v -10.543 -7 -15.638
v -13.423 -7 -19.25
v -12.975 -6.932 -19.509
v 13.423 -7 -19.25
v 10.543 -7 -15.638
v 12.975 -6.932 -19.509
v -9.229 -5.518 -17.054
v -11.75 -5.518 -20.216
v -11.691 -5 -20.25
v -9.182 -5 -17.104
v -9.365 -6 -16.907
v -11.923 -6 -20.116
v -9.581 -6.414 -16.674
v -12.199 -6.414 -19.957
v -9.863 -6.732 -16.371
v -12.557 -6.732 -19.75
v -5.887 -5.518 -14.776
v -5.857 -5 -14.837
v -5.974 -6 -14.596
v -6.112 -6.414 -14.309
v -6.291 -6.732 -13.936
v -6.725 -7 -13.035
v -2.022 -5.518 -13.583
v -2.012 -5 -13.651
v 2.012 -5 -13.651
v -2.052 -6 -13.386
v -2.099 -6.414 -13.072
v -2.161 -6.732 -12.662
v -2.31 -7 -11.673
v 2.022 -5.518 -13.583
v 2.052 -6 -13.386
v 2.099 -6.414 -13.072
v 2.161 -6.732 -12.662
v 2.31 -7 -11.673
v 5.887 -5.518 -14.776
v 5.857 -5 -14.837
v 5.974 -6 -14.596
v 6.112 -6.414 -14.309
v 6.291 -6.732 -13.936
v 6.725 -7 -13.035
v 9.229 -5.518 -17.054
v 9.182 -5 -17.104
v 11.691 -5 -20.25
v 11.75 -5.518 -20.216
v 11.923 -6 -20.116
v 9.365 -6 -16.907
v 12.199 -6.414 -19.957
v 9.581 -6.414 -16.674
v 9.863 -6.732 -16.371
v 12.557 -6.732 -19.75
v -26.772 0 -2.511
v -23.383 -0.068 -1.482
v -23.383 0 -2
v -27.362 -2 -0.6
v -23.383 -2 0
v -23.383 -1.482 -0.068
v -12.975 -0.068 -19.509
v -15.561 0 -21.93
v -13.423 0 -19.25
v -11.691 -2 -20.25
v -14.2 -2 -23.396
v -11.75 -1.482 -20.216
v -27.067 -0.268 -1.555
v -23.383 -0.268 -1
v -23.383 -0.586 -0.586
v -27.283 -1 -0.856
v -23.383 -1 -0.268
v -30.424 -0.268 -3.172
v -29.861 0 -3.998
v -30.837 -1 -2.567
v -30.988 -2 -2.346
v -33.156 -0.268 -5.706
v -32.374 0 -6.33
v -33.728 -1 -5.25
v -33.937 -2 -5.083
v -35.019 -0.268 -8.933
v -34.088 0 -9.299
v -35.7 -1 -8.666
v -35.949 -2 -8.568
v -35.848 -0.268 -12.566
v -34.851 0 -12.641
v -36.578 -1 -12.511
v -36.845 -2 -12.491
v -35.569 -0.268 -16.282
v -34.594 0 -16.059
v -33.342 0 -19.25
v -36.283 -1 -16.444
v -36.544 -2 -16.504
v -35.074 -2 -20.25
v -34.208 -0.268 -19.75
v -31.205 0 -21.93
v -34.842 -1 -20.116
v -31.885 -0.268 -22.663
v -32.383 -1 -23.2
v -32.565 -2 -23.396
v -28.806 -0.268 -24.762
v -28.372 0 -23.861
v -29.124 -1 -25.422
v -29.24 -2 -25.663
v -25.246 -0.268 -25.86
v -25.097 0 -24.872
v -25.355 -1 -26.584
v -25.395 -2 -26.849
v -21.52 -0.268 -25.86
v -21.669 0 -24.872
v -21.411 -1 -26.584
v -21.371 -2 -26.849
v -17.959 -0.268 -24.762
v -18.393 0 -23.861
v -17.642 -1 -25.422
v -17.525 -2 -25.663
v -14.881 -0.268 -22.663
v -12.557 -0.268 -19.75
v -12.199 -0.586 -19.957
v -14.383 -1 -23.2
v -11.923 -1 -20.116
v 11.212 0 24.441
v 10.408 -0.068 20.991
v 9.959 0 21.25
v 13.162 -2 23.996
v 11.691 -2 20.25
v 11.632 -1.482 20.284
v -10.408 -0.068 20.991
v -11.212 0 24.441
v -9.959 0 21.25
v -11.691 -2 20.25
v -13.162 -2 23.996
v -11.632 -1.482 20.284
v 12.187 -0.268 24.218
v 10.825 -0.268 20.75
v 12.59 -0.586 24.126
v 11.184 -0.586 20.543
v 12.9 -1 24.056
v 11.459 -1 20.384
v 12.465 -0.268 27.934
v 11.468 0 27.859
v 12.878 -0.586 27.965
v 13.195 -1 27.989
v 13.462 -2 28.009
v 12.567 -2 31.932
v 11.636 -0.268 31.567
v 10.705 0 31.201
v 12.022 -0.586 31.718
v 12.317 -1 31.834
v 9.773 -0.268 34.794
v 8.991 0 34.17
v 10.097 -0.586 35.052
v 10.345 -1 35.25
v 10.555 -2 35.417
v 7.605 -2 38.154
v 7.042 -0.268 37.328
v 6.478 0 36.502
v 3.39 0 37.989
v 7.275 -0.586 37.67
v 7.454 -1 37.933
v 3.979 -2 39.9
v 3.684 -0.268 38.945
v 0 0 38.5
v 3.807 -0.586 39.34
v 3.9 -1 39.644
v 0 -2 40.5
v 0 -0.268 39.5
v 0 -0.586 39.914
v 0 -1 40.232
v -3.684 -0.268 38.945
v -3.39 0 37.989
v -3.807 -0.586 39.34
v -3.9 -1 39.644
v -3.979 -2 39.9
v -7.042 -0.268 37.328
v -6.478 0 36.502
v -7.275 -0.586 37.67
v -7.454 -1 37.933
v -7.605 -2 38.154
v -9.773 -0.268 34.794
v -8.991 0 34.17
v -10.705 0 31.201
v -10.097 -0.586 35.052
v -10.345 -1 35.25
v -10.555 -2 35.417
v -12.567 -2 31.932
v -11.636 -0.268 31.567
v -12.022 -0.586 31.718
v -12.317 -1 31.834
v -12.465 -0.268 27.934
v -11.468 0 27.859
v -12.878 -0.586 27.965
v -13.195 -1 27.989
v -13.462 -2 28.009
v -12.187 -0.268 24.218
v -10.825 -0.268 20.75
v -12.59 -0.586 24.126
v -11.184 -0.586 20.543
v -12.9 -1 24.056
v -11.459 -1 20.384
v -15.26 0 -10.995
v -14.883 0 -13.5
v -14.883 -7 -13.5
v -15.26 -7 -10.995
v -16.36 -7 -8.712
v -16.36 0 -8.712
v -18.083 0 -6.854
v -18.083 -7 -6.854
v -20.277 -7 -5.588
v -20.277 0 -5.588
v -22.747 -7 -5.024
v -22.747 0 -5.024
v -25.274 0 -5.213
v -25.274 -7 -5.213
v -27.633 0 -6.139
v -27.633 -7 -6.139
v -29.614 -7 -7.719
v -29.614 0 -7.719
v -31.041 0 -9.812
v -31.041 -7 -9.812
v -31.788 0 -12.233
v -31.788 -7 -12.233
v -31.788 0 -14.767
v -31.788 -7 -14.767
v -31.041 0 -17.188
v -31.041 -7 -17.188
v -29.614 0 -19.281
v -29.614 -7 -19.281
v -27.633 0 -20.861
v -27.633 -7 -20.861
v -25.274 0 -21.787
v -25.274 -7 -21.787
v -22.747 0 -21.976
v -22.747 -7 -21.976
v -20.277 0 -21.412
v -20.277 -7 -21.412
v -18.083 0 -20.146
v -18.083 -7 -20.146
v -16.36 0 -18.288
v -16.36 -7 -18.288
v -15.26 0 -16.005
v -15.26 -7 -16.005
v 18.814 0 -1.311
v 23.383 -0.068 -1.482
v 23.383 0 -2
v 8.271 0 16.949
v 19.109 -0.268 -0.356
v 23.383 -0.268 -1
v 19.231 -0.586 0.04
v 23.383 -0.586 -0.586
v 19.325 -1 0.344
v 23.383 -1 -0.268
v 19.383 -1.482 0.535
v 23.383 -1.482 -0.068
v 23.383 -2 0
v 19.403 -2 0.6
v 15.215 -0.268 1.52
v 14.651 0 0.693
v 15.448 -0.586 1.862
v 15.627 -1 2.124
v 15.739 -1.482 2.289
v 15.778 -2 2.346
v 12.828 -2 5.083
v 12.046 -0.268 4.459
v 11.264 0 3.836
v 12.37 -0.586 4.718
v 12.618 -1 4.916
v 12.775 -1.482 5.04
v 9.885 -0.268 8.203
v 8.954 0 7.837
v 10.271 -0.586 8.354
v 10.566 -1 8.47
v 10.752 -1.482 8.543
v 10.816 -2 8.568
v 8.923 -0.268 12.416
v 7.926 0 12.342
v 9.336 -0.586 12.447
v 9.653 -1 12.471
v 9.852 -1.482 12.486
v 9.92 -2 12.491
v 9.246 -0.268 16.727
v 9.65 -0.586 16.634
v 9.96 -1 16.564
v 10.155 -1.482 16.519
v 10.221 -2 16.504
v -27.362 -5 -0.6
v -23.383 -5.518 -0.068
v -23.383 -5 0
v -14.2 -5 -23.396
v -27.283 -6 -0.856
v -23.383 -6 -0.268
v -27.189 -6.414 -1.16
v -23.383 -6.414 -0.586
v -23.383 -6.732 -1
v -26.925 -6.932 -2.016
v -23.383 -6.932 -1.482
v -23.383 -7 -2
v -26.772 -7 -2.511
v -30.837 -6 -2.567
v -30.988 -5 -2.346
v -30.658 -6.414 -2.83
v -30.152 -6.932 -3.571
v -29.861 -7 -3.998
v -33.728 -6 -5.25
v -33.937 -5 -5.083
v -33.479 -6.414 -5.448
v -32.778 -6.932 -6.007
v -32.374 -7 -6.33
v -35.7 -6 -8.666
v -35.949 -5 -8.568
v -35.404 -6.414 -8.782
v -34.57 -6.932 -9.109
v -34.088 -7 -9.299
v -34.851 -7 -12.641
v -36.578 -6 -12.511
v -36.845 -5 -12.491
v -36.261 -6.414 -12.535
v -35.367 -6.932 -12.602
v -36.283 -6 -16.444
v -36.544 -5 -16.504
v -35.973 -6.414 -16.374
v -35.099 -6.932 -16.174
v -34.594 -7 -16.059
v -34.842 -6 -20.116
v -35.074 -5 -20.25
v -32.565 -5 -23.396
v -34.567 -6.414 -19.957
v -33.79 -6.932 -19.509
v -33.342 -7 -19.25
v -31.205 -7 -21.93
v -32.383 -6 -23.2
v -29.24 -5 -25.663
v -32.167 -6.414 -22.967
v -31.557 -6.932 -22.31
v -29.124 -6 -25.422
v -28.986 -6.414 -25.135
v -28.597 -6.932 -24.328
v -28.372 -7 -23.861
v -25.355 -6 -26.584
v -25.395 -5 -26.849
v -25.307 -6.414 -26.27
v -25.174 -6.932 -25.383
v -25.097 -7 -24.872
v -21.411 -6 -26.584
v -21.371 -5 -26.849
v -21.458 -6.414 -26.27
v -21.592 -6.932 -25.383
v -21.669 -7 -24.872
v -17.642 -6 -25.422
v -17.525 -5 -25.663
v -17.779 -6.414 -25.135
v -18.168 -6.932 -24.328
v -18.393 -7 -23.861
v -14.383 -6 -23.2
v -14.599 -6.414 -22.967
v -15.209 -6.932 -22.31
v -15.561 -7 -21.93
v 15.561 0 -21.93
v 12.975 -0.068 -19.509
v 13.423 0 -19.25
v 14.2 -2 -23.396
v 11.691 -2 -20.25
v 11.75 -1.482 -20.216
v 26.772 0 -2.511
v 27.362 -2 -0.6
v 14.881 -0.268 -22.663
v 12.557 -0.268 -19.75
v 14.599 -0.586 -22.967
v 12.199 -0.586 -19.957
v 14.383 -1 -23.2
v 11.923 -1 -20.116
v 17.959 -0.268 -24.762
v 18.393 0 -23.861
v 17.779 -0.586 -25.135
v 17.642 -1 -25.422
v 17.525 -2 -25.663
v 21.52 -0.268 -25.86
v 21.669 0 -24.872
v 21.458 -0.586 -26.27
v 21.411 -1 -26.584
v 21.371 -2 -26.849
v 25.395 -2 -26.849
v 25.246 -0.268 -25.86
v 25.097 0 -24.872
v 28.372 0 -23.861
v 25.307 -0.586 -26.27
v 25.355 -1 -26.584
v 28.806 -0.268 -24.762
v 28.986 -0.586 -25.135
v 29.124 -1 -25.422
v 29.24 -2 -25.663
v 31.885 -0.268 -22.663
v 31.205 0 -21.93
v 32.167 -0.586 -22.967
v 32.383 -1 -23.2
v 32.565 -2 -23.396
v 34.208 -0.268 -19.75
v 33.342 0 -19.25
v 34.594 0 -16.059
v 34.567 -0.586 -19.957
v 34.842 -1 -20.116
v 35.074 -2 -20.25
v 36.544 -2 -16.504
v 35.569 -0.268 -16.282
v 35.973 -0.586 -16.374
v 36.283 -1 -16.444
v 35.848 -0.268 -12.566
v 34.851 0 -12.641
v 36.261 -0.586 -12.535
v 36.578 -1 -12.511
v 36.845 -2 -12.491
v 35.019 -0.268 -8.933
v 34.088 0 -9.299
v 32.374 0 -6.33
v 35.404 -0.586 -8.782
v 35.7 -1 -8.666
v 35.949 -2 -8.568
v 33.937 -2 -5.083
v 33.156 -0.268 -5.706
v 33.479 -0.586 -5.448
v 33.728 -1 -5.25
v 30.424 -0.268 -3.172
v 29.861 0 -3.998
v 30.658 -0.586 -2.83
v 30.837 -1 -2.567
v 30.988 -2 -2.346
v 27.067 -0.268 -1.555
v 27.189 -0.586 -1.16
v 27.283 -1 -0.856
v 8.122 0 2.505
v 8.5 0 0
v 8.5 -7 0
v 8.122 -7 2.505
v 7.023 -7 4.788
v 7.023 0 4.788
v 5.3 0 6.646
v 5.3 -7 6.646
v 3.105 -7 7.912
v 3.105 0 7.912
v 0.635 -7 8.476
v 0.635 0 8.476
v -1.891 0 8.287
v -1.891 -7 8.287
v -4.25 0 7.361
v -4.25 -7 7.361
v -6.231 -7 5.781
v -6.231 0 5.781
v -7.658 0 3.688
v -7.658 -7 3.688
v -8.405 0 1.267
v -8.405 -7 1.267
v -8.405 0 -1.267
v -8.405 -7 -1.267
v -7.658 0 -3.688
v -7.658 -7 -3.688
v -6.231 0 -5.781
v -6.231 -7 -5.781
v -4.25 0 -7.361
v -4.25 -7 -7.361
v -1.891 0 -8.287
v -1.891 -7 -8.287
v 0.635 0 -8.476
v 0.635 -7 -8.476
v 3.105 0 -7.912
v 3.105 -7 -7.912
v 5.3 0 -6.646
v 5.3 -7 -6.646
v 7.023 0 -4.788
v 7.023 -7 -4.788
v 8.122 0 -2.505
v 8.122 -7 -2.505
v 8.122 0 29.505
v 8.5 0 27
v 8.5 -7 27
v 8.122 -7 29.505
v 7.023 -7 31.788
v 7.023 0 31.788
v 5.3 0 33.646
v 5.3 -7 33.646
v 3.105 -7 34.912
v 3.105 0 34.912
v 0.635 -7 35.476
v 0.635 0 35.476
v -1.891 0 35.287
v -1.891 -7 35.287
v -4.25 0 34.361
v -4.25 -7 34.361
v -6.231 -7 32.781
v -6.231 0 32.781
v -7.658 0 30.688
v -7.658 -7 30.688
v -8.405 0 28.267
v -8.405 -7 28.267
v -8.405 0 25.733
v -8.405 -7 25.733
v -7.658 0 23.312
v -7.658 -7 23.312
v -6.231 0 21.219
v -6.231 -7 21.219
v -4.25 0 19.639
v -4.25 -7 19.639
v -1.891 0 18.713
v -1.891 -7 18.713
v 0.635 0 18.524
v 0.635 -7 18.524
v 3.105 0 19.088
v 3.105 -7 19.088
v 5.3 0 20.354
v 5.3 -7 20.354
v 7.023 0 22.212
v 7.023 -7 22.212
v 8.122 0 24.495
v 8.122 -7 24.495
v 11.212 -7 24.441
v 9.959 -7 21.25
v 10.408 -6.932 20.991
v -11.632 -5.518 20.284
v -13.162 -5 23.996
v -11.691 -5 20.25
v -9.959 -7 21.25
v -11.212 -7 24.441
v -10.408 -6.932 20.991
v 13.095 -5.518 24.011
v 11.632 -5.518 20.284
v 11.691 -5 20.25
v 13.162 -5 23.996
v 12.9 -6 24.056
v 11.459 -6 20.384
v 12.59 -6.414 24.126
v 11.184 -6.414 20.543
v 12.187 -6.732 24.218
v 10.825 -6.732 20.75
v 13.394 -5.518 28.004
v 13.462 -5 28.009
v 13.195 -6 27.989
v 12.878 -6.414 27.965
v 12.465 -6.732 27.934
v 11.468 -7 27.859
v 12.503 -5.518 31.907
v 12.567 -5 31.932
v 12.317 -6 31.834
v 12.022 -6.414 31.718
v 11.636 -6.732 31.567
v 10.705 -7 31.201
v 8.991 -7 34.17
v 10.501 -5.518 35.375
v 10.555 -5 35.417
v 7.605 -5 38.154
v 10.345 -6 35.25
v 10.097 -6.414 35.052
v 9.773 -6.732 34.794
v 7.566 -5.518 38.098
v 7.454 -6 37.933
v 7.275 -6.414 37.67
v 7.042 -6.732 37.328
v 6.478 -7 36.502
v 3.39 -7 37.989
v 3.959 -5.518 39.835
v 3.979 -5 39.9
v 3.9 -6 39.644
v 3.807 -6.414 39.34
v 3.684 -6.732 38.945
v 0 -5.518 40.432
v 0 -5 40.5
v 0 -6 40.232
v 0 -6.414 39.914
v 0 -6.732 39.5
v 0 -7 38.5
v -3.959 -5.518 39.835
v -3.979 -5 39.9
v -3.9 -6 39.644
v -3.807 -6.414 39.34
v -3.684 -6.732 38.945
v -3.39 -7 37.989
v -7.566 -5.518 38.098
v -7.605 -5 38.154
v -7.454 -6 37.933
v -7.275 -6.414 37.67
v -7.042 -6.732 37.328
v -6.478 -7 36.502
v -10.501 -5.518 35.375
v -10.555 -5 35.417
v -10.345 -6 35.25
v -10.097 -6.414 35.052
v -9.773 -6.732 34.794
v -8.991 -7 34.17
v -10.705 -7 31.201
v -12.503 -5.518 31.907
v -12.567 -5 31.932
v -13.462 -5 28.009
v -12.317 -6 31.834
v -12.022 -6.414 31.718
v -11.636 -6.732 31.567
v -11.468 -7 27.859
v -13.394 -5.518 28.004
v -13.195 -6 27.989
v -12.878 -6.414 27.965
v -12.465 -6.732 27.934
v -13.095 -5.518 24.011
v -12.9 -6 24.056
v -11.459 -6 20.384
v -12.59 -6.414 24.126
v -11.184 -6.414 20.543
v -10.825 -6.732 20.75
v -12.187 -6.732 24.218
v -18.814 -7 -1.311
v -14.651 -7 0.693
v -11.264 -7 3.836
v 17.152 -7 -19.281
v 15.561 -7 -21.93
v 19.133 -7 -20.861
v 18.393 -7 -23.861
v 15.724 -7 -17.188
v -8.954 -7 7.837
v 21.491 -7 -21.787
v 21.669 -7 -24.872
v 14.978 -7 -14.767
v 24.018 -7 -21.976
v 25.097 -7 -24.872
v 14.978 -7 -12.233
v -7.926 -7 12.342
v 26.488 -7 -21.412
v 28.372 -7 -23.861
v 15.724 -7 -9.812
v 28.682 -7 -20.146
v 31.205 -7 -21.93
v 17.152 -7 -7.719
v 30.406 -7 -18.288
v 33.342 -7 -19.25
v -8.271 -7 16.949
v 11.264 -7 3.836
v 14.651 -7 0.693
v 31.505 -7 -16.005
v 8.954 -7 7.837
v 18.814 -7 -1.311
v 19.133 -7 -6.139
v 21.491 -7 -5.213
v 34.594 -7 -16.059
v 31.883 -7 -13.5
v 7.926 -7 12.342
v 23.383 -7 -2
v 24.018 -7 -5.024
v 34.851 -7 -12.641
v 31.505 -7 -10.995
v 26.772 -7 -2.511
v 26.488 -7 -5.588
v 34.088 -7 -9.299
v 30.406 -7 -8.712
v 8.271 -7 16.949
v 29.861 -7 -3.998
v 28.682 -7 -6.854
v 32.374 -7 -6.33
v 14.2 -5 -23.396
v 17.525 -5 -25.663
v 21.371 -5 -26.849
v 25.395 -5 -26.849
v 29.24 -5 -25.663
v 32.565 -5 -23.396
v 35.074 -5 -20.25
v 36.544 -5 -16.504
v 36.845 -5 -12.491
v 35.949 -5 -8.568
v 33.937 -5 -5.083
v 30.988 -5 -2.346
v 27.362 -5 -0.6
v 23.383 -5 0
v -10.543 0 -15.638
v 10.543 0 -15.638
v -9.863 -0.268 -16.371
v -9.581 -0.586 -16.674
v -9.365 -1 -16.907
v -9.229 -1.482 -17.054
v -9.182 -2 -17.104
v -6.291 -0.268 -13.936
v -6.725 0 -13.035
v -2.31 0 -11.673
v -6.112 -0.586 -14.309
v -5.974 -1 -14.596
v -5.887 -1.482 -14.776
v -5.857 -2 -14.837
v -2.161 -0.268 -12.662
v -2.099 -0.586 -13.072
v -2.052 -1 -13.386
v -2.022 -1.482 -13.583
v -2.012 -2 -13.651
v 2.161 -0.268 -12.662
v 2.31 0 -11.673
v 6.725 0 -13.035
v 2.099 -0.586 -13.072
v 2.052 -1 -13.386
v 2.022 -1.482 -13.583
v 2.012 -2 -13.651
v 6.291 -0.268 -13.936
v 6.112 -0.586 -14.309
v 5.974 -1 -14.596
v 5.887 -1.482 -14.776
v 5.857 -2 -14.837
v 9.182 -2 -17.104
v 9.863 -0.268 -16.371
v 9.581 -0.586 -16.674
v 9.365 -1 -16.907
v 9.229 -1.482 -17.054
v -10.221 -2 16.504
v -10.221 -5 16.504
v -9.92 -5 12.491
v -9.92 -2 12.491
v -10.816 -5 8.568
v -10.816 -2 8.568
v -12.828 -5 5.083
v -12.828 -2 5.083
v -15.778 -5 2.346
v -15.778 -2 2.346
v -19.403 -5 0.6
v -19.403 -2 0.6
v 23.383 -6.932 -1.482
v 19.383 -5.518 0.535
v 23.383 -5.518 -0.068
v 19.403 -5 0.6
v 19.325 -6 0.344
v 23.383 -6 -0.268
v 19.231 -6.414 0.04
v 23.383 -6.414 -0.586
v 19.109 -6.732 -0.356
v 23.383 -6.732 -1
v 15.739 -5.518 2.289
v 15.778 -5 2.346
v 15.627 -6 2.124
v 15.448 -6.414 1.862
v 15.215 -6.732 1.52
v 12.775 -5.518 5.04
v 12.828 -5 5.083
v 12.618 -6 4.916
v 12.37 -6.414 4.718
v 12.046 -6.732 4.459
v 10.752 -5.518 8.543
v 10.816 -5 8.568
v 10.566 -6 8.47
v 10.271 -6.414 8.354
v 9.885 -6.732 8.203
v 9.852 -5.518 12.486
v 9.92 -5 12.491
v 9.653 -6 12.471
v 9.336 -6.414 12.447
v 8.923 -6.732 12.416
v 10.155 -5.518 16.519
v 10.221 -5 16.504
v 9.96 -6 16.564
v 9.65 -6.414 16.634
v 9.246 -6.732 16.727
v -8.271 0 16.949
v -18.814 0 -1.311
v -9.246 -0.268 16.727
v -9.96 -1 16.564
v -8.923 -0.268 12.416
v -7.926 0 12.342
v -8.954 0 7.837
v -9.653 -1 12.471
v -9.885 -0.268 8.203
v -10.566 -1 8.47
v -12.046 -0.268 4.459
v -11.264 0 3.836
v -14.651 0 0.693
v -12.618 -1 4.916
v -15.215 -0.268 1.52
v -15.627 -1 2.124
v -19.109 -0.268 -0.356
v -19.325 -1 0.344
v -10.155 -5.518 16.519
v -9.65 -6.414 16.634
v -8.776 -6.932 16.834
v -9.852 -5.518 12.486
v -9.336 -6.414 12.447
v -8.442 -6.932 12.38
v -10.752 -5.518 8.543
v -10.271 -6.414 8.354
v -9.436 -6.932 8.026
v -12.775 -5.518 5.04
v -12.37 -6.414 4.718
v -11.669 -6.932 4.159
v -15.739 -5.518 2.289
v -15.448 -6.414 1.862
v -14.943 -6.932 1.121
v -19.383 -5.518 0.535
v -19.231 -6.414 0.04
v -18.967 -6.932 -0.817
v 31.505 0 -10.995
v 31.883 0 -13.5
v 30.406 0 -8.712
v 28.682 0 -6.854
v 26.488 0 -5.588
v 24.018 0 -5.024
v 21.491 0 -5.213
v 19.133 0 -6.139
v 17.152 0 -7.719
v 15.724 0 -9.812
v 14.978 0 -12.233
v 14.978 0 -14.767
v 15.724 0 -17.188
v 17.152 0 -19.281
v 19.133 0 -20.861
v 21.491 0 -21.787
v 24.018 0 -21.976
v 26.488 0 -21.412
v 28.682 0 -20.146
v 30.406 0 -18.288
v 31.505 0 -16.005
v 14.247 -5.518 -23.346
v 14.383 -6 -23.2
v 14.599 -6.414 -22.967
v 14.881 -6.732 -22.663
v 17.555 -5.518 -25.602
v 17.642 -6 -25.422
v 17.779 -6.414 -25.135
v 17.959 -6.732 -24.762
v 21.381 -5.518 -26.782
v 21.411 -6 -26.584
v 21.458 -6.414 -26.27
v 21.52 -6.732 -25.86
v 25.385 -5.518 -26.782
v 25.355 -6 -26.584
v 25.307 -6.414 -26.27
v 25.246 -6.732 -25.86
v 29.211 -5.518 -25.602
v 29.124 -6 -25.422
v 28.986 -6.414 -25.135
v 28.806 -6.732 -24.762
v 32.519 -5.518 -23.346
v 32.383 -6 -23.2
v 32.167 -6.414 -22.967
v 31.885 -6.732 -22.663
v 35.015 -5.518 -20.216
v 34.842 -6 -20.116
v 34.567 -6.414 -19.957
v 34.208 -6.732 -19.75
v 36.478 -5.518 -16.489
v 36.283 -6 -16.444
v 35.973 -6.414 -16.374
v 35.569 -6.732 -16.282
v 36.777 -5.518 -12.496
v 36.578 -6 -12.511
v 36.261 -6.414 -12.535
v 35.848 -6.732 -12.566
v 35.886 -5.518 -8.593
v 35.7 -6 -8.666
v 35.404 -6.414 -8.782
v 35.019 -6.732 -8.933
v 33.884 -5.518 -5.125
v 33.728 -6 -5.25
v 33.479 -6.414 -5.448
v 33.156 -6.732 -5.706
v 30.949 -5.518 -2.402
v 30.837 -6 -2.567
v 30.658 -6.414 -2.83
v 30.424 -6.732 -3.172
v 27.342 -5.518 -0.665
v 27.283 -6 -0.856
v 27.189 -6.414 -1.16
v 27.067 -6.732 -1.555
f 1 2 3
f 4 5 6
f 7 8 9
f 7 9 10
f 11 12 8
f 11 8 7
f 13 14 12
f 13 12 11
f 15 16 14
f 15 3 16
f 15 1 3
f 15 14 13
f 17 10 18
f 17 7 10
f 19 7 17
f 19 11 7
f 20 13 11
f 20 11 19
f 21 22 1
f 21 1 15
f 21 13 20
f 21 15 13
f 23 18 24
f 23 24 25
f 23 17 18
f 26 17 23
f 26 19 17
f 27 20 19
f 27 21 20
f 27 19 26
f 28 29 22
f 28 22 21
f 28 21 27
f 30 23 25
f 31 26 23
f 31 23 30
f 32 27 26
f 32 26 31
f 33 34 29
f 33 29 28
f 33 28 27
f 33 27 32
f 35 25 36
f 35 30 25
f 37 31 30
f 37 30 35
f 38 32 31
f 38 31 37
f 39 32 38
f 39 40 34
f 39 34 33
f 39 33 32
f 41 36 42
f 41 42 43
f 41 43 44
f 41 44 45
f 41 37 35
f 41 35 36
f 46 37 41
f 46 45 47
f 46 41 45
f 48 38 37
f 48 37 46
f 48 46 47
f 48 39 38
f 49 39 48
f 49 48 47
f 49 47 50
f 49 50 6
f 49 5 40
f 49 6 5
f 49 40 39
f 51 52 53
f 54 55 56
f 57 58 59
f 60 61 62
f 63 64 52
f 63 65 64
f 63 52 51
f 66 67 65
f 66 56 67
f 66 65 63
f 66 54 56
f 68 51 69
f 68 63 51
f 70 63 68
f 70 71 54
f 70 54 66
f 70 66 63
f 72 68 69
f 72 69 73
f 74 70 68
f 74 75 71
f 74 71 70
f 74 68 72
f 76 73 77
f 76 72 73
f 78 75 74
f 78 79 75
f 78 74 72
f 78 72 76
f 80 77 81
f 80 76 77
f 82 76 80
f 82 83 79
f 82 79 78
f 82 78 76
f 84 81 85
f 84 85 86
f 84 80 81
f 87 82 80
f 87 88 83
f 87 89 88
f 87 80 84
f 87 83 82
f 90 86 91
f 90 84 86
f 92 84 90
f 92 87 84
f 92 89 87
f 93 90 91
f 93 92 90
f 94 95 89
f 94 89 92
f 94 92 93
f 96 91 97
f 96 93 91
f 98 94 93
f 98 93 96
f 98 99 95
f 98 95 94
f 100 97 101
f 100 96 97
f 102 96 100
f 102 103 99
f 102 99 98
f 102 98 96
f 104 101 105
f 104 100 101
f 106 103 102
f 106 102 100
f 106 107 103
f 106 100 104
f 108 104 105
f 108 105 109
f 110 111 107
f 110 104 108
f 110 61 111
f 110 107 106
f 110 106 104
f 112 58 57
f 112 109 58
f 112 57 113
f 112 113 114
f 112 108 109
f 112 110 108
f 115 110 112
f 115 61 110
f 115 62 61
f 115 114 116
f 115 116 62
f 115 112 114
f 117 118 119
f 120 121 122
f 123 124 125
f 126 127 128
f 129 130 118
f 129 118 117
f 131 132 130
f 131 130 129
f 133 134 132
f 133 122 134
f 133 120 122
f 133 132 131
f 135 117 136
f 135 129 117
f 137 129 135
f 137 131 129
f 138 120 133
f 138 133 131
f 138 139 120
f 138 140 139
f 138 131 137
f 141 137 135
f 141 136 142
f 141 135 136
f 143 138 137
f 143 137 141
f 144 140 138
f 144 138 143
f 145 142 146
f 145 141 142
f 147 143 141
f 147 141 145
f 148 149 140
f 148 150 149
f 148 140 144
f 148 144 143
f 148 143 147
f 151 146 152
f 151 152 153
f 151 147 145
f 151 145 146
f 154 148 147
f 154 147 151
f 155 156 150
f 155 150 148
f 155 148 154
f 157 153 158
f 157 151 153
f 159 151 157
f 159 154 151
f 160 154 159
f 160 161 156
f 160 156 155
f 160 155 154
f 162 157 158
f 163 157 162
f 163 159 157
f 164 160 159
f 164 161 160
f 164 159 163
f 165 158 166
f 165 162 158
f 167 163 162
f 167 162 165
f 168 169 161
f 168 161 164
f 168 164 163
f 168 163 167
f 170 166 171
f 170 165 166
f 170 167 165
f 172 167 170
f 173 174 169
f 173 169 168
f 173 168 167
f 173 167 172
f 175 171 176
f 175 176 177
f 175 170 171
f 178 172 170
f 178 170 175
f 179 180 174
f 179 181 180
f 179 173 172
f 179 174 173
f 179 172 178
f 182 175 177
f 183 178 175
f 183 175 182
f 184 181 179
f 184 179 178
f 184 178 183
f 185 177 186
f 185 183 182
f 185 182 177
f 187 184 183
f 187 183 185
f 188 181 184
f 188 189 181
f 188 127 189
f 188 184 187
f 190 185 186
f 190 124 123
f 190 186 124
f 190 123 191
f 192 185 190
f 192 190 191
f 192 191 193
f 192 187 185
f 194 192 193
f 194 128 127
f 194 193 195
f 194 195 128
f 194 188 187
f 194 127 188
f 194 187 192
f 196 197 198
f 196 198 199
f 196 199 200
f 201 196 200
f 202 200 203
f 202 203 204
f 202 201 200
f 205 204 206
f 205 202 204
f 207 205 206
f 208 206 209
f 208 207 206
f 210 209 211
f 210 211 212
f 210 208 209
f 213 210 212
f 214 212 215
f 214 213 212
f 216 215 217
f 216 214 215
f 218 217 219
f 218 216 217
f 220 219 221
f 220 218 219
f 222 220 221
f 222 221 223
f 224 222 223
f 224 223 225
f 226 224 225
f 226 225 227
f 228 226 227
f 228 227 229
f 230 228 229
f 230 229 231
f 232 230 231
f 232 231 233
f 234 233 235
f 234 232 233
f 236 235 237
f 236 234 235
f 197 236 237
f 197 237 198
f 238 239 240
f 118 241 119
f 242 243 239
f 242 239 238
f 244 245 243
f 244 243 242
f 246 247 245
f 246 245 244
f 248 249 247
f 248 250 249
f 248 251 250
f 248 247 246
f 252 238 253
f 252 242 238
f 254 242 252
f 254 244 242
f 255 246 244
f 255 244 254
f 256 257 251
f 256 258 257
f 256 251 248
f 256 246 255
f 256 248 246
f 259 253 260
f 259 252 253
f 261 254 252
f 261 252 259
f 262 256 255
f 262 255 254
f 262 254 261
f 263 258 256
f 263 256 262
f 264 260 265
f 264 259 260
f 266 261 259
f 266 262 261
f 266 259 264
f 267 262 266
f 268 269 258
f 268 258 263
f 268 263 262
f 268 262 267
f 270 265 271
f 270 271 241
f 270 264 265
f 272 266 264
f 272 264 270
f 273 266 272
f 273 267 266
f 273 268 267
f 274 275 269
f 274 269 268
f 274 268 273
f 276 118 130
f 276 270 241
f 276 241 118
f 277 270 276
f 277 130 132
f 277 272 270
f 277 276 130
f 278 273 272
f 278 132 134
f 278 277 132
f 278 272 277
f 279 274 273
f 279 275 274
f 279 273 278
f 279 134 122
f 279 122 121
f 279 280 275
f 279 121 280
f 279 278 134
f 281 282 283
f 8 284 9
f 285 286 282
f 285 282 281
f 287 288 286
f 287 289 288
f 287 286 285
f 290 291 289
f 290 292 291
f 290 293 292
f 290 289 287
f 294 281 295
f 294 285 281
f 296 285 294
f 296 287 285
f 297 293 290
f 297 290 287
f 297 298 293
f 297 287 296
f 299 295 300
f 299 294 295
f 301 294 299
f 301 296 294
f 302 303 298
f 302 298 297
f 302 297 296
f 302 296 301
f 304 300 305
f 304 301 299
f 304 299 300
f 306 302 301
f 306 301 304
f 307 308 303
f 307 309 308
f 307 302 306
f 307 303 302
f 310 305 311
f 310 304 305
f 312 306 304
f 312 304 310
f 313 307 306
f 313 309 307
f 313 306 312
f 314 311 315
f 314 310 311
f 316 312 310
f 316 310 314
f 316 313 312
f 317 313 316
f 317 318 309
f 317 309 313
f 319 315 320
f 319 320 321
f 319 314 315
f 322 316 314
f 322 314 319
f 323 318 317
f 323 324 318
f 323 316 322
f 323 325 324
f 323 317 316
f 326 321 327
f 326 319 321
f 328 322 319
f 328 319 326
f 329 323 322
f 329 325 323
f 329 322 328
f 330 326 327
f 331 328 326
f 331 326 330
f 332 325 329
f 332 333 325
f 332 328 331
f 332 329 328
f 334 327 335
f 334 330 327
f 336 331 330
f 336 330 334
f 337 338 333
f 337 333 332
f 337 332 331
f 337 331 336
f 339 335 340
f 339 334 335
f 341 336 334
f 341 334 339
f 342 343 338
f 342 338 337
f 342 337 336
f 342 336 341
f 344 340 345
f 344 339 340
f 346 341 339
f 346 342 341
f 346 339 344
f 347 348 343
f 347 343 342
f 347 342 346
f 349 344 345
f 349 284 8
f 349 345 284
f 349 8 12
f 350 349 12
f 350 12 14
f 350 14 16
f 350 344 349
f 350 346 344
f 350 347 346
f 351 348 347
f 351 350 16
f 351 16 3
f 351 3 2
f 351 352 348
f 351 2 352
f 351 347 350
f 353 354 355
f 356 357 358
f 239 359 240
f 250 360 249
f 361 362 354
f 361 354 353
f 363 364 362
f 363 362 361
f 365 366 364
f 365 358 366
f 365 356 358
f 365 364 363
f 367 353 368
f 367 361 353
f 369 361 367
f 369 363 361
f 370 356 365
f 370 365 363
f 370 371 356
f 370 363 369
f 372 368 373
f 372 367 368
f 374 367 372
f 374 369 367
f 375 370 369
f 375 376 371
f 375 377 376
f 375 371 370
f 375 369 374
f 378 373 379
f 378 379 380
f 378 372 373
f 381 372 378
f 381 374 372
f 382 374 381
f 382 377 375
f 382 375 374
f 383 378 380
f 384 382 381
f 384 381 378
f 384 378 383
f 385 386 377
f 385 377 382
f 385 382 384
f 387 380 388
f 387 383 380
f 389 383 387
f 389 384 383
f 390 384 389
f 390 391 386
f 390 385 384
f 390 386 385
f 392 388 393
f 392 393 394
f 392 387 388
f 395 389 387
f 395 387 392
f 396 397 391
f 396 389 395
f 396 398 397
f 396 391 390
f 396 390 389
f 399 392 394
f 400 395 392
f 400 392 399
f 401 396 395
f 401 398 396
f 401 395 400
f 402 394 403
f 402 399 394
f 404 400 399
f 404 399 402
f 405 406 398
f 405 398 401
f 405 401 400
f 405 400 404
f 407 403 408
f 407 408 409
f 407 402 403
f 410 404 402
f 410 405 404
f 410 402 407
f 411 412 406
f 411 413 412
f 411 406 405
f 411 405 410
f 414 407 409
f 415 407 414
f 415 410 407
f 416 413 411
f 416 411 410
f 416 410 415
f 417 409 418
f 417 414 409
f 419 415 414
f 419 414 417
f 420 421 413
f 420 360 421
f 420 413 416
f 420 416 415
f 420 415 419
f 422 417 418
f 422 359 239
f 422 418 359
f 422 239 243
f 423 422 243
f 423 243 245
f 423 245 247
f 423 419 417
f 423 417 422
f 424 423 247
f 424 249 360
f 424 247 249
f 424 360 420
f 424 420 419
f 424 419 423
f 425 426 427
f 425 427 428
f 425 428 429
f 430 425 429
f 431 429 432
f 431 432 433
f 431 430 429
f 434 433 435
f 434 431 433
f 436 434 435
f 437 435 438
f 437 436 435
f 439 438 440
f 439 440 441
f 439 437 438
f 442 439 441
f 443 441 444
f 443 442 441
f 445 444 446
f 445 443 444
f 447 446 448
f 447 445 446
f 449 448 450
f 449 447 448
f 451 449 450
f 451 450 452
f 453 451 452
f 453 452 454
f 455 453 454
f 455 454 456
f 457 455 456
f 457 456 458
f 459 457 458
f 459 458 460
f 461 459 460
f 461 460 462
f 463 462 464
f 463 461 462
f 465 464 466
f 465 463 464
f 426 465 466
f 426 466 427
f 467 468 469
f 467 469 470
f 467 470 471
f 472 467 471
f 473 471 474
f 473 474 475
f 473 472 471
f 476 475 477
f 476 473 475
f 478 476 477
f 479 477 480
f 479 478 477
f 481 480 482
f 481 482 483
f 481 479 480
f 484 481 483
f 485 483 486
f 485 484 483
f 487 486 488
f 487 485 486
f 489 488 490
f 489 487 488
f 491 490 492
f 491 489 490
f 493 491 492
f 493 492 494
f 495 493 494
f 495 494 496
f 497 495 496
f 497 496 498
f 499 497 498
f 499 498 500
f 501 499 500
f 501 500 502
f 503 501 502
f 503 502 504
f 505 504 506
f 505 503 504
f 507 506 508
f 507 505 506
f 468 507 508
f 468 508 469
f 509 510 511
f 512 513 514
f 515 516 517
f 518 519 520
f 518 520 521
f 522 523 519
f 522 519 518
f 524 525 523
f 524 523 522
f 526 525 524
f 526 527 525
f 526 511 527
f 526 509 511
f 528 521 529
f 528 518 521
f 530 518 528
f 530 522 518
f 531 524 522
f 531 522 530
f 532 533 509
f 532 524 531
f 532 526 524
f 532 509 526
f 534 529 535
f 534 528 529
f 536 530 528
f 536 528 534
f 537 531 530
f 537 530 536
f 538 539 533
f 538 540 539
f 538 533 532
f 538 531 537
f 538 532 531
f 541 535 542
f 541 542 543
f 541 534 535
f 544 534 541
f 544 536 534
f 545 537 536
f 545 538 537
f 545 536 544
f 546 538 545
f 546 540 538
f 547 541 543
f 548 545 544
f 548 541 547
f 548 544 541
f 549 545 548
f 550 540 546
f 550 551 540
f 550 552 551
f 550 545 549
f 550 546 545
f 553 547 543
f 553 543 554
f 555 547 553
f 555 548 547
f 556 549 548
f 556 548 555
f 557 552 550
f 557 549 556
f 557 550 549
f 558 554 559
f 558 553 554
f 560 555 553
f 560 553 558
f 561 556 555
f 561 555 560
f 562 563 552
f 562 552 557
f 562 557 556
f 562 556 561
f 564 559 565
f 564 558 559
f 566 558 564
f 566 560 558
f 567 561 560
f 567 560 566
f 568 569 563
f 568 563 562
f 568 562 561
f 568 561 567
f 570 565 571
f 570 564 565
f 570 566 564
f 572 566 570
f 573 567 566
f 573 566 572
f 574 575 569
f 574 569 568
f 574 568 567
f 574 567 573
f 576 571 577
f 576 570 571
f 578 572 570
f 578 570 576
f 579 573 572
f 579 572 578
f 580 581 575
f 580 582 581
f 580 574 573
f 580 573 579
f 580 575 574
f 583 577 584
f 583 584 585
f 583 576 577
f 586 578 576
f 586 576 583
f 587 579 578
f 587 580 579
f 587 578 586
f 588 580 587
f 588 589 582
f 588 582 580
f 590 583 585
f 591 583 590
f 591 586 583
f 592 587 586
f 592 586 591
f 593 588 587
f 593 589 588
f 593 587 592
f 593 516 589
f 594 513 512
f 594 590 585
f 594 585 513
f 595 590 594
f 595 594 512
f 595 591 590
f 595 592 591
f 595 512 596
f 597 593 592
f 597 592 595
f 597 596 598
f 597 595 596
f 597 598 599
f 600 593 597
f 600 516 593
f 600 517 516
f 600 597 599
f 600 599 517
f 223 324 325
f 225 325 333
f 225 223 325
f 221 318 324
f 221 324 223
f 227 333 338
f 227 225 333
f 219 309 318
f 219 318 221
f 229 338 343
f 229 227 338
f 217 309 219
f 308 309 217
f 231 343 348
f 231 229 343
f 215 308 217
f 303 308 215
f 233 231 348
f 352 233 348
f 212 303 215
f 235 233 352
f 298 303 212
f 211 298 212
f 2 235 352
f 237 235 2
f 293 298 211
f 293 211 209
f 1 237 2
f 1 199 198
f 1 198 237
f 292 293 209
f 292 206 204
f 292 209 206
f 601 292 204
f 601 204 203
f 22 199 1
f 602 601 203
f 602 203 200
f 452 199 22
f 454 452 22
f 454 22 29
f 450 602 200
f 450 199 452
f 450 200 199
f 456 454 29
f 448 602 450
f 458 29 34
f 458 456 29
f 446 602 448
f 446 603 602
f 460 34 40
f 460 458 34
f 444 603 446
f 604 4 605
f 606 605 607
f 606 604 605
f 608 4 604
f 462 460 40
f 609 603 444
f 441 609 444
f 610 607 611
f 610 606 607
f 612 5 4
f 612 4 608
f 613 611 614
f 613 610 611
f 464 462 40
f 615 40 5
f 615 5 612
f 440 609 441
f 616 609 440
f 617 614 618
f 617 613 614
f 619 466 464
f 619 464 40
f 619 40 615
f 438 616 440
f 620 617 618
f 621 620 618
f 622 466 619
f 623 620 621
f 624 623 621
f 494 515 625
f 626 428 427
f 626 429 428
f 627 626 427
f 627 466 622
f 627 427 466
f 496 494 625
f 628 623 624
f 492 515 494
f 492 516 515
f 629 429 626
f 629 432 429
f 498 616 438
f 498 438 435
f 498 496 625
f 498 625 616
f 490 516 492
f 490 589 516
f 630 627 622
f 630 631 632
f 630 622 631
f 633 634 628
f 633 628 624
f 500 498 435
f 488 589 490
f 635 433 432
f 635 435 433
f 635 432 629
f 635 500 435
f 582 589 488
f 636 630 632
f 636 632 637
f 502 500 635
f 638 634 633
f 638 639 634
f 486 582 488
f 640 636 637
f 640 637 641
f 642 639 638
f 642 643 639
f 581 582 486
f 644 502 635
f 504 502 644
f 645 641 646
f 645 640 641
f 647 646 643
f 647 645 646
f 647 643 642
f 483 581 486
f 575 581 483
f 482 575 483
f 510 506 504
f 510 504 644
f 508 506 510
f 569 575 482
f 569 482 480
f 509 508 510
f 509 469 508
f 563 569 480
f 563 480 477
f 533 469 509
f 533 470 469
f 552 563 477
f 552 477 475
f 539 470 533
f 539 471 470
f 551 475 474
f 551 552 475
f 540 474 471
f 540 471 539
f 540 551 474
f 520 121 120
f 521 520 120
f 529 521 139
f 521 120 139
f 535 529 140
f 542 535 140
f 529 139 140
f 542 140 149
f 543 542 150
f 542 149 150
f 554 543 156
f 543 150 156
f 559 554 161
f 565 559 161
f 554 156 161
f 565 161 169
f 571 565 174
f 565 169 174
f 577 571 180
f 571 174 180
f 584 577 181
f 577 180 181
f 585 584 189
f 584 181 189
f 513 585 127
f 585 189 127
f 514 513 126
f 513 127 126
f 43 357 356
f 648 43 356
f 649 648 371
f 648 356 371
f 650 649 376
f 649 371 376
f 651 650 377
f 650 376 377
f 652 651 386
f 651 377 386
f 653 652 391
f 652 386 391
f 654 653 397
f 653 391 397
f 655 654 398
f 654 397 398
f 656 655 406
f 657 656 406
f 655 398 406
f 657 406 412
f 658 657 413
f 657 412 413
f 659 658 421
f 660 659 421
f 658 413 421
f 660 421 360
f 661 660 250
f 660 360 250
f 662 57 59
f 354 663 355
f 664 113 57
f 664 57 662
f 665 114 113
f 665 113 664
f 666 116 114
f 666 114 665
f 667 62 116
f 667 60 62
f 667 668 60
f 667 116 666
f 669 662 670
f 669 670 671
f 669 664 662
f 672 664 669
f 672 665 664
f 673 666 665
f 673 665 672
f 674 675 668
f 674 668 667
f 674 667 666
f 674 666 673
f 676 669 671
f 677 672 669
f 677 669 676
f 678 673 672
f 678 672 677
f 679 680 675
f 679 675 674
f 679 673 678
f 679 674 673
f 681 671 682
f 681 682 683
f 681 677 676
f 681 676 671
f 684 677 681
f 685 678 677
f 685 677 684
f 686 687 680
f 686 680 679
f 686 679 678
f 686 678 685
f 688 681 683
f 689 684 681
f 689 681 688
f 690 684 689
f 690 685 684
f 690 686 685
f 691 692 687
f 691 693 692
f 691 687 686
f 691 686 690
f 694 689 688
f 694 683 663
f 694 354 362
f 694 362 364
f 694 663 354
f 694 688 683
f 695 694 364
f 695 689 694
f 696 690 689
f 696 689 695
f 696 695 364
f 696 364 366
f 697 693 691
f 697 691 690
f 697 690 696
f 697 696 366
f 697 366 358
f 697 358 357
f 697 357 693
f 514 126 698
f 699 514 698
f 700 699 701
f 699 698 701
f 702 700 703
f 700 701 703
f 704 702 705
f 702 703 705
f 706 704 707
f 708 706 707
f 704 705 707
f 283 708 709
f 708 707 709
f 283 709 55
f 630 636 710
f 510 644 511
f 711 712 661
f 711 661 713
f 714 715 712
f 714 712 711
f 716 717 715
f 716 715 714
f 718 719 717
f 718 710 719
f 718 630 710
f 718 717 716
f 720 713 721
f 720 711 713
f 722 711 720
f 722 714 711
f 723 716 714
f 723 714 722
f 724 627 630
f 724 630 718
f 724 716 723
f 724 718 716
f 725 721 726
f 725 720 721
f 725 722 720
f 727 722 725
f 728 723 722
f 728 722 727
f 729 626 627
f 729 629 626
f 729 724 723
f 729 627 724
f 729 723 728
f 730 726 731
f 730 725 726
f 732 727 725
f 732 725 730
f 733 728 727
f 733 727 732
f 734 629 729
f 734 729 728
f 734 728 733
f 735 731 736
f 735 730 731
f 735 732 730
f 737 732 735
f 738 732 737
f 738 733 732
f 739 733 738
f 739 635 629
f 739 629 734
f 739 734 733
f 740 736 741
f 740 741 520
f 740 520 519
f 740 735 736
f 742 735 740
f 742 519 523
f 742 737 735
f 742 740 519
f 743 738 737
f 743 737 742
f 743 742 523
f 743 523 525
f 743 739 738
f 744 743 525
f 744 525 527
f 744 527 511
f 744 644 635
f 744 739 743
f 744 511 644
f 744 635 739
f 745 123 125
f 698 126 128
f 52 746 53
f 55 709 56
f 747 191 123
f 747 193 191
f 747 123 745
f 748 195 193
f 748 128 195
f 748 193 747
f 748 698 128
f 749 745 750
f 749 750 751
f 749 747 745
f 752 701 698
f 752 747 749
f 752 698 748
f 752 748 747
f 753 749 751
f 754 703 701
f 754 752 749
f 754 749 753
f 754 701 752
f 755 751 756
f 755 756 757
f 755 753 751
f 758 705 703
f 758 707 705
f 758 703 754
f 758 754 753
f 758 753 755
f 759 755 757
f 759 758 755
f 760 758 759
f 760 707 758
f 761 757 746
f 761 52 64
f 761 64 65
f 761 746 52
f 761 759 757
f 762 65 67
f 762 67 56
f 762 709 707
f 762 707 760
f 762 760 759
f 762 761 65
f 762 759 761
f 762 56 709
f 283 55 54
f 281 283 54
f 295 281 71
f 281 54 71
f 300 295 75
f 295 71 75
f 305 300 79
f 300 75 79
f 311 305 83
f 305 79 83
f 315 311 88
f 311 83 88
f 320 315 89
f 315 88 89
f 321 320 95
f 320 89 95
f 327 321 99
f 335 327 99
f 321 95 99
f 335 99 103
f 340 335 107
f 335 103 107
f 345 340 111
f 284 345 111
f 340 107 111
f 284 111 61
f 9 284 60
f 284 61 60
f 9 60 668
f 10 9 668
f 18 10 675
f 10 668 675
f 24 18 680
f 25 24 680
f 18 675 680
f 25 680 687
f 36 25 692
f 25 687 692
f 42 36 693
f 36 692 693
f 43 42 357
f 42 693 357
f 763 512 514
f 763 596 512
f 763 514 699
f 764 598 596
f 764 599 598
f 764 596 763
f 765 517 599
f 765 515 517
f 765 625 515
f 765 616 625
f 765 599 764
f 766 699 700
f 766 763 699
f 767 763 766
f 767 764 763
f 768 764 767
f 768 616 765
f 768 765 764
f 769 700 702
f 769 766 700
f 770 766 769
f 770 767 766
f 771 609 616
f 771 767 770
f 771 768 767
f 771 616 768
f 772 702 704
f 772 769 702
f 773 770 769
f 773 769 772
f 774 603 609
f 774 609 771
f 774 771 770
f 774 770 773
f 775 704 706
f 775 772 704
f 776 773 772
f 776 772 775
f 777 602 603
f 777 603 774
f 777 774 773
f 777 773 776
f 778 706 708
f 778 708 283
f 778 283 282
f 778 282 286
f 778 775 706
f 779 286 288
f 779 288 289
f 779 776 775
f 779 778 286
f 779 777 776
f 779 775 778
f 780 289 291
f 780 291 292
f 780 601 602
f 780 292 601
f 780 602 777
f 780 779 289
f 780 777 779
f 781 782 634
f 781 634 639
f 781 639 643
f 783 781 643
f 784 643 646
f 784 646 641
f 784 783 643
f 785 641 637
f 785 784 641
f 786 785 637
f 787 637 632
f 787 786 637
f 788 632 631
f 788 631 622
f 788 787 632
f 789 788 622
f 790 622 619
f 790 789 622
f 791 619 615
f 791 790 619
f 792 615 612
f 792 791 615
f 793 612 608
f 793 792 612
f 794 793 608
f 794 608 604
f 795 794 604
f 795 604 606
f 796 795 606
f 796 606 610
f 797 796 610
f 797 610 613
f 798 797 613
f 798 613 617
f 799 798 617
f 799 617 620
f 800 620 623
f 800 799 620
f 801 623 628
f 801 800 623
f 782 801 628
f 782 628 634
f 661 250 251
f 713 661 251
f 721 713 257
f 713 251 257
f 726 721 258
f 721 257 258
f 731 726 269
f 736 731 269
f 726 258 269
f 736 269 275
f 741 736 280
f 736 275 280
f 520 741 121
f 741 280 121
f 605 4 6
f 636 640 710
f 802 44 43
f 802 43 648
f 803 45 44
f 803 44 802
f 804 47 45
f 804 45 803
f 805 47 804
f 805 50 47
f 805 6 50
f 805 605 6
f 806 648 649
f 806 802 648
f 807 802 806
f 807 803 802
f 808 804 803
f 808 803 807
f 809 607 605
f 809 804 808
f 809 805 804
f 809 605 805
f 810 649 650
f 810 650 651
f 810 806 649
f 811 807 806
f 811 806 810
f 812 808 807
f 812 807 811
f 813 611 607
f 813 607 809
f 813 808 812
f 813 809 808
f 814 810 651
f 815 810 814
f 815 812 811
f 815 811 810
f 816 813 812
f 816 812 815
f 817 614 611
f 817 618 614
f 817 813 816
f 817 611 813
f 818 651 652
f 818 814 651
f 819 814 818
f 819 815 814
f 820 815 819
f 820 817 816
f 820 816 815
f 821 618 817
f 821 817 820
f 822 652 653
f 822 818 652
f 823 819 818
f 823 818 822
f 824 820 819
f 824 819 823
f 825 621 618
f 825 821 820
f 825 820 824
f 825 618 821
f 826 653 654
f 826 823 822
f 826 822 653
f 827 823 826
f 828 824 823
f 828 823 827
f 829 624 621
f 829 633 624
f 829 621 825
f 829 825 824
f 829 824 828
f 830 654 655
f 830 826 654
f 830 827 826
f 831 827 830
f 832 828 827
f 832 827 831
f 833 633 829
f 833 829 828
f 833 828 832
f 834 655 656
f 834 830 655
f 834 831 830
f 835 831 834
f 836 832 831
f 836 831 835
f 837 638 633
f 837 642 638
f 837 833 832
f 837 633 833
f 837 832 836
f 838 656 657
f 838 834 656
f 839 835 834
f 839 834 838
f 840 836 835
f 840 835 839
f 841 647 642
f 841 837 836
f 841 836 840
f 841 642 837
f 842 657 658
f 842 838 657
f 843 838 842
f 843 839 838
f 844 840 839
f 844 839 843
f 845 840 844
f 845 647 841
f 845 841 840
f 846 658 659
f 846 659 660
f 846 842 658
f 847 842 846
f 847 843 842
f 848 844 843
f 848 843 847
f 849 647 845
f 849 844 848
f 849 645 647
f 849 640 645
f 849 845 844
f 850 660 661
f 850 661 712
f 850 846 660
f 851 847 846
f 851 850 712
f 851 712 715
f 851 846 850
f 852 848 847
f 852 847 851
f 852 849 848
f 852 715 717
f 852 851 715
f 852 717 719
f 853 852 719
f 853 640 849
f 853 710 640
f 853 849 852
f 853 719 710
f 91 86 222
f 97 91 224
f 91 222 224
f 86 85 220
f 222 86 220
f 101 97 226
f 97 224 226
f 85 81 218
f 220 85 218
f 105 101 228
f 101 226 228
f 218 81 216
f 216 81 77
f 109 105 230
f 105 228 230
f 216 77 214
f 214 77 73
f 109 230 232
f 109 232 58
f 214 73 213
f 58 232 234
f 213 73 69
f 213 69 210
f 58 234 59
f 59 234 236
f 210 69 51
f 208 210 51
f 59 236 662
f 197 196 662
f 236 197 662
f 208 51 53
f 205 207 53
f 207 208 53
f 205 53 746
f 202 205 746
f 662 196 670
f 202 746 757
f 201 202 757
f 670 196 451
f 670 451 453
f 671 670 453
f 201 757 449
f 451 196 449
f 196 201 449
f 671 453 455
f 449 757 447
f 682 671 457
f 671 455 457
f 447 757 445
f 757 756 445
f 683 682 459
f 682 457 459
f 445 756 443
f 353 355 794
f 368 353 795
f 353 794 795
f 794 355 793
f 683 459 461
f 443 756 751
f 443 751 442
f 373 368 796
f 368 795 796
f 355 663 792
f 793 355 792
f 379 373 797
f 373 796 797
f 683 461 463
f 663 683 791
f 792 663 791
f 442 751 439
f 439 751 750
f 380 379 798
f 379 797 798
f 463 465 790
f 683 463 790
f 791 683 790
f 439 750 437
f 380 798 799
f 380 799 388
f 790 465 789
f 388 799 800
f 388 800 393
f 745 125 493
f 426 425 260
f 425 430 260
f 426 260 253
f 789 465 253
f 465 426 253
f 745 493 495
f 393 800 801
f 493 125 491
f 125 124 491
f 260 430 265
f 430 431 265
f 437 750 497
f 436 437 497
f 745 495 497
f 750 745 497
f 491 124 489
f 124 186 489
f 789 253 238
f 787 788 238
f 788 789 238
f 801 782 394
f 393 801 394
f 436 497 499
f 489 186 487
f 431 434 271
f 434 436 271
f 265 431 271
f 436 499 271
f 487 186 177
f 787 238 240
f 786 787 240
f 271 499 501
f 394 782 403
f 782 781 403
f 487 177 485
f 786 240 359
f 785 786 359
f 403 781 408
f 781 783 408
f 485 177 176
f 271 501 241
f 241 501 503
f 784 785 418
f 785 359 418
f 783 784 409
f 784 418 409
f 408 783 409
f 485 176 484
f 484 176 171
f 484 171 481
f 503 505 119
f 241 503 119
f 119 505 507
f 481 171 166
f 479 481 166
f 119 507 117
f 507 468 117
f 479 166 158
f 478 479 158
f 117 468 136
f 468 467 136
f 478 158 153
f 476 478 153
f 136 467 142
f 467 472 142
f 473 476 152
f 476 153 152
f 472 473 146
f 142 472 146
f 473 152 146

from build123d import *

# Parameters (mm, degrees)
F0_R     = 8.5
F1_DEPTH = 7
F2_R     = 2
F3_R     = 2


with BuildPart() as f1:
    # F0 (on Front) → F1 (new body)
    with BuildSketch(Plane.XZ):
        with BuildLine():
            ThreePointArc((23.382686, 0), (11.691343, 6.75), (11.691343, 20.25))
            ThreePointArc((11.691343, 20.25), (0, 40.5), (-11.691343, 20.25))
            ThreePointArc((-11.691343, 20.25), (-11.691343, 6.75), (-23.382686, 0))
            ThreePointArc((-23.382686, 0), (-35.074029, -20.25), (-11.691343, -20.25))
            ThreePointArc((-11.691343, -20.25), (0, -13.5), (11.691343, -20.25))
            ThreePointArc((11.691343, -20.25), (35.074029, -20.25), (23.382686, 0))
        make_face()
        with Locations((-23.382686, -13.5)):
            Circle(F0_R, mode=Mode.SUBTRACT)
        with Locations((23.382686, -13.5)):
            Circle(F0_R, mode=Mode.SUBTRACT)
        Circle(F0_R, mode=Mode.SUBTRACT)
        with Locations((0, 27)):
            Circle(F0_R, mode=Mode.SUBTRACT)
    extrude(amount=F1_DEPTH)

    # F2
    f2_edges = [f1.edges().sort_by_distance(p)[0] for p in [
        (-35.074029, -7, -20.25),
        (0, -7, -13.5),
        (35.074029, -7, -20.25),
        (11.691343, -7, 6.75),
        (0, -7, 40.5),
        (-11.691343, -7, 6.75),
    ]]
    fillet(f2_edges, radius=F2_R)

    # F3
    f3_edges = [f1.edges().sort_by_distance(p)[0] for p in [
        (-35.074029, 0, -20.25),
        (0, 0, -13.5),
        (35.074029, 0, -20.25),
    ]]
    fillet(f3_edges, radius=F3_R)


solid = f1.part
